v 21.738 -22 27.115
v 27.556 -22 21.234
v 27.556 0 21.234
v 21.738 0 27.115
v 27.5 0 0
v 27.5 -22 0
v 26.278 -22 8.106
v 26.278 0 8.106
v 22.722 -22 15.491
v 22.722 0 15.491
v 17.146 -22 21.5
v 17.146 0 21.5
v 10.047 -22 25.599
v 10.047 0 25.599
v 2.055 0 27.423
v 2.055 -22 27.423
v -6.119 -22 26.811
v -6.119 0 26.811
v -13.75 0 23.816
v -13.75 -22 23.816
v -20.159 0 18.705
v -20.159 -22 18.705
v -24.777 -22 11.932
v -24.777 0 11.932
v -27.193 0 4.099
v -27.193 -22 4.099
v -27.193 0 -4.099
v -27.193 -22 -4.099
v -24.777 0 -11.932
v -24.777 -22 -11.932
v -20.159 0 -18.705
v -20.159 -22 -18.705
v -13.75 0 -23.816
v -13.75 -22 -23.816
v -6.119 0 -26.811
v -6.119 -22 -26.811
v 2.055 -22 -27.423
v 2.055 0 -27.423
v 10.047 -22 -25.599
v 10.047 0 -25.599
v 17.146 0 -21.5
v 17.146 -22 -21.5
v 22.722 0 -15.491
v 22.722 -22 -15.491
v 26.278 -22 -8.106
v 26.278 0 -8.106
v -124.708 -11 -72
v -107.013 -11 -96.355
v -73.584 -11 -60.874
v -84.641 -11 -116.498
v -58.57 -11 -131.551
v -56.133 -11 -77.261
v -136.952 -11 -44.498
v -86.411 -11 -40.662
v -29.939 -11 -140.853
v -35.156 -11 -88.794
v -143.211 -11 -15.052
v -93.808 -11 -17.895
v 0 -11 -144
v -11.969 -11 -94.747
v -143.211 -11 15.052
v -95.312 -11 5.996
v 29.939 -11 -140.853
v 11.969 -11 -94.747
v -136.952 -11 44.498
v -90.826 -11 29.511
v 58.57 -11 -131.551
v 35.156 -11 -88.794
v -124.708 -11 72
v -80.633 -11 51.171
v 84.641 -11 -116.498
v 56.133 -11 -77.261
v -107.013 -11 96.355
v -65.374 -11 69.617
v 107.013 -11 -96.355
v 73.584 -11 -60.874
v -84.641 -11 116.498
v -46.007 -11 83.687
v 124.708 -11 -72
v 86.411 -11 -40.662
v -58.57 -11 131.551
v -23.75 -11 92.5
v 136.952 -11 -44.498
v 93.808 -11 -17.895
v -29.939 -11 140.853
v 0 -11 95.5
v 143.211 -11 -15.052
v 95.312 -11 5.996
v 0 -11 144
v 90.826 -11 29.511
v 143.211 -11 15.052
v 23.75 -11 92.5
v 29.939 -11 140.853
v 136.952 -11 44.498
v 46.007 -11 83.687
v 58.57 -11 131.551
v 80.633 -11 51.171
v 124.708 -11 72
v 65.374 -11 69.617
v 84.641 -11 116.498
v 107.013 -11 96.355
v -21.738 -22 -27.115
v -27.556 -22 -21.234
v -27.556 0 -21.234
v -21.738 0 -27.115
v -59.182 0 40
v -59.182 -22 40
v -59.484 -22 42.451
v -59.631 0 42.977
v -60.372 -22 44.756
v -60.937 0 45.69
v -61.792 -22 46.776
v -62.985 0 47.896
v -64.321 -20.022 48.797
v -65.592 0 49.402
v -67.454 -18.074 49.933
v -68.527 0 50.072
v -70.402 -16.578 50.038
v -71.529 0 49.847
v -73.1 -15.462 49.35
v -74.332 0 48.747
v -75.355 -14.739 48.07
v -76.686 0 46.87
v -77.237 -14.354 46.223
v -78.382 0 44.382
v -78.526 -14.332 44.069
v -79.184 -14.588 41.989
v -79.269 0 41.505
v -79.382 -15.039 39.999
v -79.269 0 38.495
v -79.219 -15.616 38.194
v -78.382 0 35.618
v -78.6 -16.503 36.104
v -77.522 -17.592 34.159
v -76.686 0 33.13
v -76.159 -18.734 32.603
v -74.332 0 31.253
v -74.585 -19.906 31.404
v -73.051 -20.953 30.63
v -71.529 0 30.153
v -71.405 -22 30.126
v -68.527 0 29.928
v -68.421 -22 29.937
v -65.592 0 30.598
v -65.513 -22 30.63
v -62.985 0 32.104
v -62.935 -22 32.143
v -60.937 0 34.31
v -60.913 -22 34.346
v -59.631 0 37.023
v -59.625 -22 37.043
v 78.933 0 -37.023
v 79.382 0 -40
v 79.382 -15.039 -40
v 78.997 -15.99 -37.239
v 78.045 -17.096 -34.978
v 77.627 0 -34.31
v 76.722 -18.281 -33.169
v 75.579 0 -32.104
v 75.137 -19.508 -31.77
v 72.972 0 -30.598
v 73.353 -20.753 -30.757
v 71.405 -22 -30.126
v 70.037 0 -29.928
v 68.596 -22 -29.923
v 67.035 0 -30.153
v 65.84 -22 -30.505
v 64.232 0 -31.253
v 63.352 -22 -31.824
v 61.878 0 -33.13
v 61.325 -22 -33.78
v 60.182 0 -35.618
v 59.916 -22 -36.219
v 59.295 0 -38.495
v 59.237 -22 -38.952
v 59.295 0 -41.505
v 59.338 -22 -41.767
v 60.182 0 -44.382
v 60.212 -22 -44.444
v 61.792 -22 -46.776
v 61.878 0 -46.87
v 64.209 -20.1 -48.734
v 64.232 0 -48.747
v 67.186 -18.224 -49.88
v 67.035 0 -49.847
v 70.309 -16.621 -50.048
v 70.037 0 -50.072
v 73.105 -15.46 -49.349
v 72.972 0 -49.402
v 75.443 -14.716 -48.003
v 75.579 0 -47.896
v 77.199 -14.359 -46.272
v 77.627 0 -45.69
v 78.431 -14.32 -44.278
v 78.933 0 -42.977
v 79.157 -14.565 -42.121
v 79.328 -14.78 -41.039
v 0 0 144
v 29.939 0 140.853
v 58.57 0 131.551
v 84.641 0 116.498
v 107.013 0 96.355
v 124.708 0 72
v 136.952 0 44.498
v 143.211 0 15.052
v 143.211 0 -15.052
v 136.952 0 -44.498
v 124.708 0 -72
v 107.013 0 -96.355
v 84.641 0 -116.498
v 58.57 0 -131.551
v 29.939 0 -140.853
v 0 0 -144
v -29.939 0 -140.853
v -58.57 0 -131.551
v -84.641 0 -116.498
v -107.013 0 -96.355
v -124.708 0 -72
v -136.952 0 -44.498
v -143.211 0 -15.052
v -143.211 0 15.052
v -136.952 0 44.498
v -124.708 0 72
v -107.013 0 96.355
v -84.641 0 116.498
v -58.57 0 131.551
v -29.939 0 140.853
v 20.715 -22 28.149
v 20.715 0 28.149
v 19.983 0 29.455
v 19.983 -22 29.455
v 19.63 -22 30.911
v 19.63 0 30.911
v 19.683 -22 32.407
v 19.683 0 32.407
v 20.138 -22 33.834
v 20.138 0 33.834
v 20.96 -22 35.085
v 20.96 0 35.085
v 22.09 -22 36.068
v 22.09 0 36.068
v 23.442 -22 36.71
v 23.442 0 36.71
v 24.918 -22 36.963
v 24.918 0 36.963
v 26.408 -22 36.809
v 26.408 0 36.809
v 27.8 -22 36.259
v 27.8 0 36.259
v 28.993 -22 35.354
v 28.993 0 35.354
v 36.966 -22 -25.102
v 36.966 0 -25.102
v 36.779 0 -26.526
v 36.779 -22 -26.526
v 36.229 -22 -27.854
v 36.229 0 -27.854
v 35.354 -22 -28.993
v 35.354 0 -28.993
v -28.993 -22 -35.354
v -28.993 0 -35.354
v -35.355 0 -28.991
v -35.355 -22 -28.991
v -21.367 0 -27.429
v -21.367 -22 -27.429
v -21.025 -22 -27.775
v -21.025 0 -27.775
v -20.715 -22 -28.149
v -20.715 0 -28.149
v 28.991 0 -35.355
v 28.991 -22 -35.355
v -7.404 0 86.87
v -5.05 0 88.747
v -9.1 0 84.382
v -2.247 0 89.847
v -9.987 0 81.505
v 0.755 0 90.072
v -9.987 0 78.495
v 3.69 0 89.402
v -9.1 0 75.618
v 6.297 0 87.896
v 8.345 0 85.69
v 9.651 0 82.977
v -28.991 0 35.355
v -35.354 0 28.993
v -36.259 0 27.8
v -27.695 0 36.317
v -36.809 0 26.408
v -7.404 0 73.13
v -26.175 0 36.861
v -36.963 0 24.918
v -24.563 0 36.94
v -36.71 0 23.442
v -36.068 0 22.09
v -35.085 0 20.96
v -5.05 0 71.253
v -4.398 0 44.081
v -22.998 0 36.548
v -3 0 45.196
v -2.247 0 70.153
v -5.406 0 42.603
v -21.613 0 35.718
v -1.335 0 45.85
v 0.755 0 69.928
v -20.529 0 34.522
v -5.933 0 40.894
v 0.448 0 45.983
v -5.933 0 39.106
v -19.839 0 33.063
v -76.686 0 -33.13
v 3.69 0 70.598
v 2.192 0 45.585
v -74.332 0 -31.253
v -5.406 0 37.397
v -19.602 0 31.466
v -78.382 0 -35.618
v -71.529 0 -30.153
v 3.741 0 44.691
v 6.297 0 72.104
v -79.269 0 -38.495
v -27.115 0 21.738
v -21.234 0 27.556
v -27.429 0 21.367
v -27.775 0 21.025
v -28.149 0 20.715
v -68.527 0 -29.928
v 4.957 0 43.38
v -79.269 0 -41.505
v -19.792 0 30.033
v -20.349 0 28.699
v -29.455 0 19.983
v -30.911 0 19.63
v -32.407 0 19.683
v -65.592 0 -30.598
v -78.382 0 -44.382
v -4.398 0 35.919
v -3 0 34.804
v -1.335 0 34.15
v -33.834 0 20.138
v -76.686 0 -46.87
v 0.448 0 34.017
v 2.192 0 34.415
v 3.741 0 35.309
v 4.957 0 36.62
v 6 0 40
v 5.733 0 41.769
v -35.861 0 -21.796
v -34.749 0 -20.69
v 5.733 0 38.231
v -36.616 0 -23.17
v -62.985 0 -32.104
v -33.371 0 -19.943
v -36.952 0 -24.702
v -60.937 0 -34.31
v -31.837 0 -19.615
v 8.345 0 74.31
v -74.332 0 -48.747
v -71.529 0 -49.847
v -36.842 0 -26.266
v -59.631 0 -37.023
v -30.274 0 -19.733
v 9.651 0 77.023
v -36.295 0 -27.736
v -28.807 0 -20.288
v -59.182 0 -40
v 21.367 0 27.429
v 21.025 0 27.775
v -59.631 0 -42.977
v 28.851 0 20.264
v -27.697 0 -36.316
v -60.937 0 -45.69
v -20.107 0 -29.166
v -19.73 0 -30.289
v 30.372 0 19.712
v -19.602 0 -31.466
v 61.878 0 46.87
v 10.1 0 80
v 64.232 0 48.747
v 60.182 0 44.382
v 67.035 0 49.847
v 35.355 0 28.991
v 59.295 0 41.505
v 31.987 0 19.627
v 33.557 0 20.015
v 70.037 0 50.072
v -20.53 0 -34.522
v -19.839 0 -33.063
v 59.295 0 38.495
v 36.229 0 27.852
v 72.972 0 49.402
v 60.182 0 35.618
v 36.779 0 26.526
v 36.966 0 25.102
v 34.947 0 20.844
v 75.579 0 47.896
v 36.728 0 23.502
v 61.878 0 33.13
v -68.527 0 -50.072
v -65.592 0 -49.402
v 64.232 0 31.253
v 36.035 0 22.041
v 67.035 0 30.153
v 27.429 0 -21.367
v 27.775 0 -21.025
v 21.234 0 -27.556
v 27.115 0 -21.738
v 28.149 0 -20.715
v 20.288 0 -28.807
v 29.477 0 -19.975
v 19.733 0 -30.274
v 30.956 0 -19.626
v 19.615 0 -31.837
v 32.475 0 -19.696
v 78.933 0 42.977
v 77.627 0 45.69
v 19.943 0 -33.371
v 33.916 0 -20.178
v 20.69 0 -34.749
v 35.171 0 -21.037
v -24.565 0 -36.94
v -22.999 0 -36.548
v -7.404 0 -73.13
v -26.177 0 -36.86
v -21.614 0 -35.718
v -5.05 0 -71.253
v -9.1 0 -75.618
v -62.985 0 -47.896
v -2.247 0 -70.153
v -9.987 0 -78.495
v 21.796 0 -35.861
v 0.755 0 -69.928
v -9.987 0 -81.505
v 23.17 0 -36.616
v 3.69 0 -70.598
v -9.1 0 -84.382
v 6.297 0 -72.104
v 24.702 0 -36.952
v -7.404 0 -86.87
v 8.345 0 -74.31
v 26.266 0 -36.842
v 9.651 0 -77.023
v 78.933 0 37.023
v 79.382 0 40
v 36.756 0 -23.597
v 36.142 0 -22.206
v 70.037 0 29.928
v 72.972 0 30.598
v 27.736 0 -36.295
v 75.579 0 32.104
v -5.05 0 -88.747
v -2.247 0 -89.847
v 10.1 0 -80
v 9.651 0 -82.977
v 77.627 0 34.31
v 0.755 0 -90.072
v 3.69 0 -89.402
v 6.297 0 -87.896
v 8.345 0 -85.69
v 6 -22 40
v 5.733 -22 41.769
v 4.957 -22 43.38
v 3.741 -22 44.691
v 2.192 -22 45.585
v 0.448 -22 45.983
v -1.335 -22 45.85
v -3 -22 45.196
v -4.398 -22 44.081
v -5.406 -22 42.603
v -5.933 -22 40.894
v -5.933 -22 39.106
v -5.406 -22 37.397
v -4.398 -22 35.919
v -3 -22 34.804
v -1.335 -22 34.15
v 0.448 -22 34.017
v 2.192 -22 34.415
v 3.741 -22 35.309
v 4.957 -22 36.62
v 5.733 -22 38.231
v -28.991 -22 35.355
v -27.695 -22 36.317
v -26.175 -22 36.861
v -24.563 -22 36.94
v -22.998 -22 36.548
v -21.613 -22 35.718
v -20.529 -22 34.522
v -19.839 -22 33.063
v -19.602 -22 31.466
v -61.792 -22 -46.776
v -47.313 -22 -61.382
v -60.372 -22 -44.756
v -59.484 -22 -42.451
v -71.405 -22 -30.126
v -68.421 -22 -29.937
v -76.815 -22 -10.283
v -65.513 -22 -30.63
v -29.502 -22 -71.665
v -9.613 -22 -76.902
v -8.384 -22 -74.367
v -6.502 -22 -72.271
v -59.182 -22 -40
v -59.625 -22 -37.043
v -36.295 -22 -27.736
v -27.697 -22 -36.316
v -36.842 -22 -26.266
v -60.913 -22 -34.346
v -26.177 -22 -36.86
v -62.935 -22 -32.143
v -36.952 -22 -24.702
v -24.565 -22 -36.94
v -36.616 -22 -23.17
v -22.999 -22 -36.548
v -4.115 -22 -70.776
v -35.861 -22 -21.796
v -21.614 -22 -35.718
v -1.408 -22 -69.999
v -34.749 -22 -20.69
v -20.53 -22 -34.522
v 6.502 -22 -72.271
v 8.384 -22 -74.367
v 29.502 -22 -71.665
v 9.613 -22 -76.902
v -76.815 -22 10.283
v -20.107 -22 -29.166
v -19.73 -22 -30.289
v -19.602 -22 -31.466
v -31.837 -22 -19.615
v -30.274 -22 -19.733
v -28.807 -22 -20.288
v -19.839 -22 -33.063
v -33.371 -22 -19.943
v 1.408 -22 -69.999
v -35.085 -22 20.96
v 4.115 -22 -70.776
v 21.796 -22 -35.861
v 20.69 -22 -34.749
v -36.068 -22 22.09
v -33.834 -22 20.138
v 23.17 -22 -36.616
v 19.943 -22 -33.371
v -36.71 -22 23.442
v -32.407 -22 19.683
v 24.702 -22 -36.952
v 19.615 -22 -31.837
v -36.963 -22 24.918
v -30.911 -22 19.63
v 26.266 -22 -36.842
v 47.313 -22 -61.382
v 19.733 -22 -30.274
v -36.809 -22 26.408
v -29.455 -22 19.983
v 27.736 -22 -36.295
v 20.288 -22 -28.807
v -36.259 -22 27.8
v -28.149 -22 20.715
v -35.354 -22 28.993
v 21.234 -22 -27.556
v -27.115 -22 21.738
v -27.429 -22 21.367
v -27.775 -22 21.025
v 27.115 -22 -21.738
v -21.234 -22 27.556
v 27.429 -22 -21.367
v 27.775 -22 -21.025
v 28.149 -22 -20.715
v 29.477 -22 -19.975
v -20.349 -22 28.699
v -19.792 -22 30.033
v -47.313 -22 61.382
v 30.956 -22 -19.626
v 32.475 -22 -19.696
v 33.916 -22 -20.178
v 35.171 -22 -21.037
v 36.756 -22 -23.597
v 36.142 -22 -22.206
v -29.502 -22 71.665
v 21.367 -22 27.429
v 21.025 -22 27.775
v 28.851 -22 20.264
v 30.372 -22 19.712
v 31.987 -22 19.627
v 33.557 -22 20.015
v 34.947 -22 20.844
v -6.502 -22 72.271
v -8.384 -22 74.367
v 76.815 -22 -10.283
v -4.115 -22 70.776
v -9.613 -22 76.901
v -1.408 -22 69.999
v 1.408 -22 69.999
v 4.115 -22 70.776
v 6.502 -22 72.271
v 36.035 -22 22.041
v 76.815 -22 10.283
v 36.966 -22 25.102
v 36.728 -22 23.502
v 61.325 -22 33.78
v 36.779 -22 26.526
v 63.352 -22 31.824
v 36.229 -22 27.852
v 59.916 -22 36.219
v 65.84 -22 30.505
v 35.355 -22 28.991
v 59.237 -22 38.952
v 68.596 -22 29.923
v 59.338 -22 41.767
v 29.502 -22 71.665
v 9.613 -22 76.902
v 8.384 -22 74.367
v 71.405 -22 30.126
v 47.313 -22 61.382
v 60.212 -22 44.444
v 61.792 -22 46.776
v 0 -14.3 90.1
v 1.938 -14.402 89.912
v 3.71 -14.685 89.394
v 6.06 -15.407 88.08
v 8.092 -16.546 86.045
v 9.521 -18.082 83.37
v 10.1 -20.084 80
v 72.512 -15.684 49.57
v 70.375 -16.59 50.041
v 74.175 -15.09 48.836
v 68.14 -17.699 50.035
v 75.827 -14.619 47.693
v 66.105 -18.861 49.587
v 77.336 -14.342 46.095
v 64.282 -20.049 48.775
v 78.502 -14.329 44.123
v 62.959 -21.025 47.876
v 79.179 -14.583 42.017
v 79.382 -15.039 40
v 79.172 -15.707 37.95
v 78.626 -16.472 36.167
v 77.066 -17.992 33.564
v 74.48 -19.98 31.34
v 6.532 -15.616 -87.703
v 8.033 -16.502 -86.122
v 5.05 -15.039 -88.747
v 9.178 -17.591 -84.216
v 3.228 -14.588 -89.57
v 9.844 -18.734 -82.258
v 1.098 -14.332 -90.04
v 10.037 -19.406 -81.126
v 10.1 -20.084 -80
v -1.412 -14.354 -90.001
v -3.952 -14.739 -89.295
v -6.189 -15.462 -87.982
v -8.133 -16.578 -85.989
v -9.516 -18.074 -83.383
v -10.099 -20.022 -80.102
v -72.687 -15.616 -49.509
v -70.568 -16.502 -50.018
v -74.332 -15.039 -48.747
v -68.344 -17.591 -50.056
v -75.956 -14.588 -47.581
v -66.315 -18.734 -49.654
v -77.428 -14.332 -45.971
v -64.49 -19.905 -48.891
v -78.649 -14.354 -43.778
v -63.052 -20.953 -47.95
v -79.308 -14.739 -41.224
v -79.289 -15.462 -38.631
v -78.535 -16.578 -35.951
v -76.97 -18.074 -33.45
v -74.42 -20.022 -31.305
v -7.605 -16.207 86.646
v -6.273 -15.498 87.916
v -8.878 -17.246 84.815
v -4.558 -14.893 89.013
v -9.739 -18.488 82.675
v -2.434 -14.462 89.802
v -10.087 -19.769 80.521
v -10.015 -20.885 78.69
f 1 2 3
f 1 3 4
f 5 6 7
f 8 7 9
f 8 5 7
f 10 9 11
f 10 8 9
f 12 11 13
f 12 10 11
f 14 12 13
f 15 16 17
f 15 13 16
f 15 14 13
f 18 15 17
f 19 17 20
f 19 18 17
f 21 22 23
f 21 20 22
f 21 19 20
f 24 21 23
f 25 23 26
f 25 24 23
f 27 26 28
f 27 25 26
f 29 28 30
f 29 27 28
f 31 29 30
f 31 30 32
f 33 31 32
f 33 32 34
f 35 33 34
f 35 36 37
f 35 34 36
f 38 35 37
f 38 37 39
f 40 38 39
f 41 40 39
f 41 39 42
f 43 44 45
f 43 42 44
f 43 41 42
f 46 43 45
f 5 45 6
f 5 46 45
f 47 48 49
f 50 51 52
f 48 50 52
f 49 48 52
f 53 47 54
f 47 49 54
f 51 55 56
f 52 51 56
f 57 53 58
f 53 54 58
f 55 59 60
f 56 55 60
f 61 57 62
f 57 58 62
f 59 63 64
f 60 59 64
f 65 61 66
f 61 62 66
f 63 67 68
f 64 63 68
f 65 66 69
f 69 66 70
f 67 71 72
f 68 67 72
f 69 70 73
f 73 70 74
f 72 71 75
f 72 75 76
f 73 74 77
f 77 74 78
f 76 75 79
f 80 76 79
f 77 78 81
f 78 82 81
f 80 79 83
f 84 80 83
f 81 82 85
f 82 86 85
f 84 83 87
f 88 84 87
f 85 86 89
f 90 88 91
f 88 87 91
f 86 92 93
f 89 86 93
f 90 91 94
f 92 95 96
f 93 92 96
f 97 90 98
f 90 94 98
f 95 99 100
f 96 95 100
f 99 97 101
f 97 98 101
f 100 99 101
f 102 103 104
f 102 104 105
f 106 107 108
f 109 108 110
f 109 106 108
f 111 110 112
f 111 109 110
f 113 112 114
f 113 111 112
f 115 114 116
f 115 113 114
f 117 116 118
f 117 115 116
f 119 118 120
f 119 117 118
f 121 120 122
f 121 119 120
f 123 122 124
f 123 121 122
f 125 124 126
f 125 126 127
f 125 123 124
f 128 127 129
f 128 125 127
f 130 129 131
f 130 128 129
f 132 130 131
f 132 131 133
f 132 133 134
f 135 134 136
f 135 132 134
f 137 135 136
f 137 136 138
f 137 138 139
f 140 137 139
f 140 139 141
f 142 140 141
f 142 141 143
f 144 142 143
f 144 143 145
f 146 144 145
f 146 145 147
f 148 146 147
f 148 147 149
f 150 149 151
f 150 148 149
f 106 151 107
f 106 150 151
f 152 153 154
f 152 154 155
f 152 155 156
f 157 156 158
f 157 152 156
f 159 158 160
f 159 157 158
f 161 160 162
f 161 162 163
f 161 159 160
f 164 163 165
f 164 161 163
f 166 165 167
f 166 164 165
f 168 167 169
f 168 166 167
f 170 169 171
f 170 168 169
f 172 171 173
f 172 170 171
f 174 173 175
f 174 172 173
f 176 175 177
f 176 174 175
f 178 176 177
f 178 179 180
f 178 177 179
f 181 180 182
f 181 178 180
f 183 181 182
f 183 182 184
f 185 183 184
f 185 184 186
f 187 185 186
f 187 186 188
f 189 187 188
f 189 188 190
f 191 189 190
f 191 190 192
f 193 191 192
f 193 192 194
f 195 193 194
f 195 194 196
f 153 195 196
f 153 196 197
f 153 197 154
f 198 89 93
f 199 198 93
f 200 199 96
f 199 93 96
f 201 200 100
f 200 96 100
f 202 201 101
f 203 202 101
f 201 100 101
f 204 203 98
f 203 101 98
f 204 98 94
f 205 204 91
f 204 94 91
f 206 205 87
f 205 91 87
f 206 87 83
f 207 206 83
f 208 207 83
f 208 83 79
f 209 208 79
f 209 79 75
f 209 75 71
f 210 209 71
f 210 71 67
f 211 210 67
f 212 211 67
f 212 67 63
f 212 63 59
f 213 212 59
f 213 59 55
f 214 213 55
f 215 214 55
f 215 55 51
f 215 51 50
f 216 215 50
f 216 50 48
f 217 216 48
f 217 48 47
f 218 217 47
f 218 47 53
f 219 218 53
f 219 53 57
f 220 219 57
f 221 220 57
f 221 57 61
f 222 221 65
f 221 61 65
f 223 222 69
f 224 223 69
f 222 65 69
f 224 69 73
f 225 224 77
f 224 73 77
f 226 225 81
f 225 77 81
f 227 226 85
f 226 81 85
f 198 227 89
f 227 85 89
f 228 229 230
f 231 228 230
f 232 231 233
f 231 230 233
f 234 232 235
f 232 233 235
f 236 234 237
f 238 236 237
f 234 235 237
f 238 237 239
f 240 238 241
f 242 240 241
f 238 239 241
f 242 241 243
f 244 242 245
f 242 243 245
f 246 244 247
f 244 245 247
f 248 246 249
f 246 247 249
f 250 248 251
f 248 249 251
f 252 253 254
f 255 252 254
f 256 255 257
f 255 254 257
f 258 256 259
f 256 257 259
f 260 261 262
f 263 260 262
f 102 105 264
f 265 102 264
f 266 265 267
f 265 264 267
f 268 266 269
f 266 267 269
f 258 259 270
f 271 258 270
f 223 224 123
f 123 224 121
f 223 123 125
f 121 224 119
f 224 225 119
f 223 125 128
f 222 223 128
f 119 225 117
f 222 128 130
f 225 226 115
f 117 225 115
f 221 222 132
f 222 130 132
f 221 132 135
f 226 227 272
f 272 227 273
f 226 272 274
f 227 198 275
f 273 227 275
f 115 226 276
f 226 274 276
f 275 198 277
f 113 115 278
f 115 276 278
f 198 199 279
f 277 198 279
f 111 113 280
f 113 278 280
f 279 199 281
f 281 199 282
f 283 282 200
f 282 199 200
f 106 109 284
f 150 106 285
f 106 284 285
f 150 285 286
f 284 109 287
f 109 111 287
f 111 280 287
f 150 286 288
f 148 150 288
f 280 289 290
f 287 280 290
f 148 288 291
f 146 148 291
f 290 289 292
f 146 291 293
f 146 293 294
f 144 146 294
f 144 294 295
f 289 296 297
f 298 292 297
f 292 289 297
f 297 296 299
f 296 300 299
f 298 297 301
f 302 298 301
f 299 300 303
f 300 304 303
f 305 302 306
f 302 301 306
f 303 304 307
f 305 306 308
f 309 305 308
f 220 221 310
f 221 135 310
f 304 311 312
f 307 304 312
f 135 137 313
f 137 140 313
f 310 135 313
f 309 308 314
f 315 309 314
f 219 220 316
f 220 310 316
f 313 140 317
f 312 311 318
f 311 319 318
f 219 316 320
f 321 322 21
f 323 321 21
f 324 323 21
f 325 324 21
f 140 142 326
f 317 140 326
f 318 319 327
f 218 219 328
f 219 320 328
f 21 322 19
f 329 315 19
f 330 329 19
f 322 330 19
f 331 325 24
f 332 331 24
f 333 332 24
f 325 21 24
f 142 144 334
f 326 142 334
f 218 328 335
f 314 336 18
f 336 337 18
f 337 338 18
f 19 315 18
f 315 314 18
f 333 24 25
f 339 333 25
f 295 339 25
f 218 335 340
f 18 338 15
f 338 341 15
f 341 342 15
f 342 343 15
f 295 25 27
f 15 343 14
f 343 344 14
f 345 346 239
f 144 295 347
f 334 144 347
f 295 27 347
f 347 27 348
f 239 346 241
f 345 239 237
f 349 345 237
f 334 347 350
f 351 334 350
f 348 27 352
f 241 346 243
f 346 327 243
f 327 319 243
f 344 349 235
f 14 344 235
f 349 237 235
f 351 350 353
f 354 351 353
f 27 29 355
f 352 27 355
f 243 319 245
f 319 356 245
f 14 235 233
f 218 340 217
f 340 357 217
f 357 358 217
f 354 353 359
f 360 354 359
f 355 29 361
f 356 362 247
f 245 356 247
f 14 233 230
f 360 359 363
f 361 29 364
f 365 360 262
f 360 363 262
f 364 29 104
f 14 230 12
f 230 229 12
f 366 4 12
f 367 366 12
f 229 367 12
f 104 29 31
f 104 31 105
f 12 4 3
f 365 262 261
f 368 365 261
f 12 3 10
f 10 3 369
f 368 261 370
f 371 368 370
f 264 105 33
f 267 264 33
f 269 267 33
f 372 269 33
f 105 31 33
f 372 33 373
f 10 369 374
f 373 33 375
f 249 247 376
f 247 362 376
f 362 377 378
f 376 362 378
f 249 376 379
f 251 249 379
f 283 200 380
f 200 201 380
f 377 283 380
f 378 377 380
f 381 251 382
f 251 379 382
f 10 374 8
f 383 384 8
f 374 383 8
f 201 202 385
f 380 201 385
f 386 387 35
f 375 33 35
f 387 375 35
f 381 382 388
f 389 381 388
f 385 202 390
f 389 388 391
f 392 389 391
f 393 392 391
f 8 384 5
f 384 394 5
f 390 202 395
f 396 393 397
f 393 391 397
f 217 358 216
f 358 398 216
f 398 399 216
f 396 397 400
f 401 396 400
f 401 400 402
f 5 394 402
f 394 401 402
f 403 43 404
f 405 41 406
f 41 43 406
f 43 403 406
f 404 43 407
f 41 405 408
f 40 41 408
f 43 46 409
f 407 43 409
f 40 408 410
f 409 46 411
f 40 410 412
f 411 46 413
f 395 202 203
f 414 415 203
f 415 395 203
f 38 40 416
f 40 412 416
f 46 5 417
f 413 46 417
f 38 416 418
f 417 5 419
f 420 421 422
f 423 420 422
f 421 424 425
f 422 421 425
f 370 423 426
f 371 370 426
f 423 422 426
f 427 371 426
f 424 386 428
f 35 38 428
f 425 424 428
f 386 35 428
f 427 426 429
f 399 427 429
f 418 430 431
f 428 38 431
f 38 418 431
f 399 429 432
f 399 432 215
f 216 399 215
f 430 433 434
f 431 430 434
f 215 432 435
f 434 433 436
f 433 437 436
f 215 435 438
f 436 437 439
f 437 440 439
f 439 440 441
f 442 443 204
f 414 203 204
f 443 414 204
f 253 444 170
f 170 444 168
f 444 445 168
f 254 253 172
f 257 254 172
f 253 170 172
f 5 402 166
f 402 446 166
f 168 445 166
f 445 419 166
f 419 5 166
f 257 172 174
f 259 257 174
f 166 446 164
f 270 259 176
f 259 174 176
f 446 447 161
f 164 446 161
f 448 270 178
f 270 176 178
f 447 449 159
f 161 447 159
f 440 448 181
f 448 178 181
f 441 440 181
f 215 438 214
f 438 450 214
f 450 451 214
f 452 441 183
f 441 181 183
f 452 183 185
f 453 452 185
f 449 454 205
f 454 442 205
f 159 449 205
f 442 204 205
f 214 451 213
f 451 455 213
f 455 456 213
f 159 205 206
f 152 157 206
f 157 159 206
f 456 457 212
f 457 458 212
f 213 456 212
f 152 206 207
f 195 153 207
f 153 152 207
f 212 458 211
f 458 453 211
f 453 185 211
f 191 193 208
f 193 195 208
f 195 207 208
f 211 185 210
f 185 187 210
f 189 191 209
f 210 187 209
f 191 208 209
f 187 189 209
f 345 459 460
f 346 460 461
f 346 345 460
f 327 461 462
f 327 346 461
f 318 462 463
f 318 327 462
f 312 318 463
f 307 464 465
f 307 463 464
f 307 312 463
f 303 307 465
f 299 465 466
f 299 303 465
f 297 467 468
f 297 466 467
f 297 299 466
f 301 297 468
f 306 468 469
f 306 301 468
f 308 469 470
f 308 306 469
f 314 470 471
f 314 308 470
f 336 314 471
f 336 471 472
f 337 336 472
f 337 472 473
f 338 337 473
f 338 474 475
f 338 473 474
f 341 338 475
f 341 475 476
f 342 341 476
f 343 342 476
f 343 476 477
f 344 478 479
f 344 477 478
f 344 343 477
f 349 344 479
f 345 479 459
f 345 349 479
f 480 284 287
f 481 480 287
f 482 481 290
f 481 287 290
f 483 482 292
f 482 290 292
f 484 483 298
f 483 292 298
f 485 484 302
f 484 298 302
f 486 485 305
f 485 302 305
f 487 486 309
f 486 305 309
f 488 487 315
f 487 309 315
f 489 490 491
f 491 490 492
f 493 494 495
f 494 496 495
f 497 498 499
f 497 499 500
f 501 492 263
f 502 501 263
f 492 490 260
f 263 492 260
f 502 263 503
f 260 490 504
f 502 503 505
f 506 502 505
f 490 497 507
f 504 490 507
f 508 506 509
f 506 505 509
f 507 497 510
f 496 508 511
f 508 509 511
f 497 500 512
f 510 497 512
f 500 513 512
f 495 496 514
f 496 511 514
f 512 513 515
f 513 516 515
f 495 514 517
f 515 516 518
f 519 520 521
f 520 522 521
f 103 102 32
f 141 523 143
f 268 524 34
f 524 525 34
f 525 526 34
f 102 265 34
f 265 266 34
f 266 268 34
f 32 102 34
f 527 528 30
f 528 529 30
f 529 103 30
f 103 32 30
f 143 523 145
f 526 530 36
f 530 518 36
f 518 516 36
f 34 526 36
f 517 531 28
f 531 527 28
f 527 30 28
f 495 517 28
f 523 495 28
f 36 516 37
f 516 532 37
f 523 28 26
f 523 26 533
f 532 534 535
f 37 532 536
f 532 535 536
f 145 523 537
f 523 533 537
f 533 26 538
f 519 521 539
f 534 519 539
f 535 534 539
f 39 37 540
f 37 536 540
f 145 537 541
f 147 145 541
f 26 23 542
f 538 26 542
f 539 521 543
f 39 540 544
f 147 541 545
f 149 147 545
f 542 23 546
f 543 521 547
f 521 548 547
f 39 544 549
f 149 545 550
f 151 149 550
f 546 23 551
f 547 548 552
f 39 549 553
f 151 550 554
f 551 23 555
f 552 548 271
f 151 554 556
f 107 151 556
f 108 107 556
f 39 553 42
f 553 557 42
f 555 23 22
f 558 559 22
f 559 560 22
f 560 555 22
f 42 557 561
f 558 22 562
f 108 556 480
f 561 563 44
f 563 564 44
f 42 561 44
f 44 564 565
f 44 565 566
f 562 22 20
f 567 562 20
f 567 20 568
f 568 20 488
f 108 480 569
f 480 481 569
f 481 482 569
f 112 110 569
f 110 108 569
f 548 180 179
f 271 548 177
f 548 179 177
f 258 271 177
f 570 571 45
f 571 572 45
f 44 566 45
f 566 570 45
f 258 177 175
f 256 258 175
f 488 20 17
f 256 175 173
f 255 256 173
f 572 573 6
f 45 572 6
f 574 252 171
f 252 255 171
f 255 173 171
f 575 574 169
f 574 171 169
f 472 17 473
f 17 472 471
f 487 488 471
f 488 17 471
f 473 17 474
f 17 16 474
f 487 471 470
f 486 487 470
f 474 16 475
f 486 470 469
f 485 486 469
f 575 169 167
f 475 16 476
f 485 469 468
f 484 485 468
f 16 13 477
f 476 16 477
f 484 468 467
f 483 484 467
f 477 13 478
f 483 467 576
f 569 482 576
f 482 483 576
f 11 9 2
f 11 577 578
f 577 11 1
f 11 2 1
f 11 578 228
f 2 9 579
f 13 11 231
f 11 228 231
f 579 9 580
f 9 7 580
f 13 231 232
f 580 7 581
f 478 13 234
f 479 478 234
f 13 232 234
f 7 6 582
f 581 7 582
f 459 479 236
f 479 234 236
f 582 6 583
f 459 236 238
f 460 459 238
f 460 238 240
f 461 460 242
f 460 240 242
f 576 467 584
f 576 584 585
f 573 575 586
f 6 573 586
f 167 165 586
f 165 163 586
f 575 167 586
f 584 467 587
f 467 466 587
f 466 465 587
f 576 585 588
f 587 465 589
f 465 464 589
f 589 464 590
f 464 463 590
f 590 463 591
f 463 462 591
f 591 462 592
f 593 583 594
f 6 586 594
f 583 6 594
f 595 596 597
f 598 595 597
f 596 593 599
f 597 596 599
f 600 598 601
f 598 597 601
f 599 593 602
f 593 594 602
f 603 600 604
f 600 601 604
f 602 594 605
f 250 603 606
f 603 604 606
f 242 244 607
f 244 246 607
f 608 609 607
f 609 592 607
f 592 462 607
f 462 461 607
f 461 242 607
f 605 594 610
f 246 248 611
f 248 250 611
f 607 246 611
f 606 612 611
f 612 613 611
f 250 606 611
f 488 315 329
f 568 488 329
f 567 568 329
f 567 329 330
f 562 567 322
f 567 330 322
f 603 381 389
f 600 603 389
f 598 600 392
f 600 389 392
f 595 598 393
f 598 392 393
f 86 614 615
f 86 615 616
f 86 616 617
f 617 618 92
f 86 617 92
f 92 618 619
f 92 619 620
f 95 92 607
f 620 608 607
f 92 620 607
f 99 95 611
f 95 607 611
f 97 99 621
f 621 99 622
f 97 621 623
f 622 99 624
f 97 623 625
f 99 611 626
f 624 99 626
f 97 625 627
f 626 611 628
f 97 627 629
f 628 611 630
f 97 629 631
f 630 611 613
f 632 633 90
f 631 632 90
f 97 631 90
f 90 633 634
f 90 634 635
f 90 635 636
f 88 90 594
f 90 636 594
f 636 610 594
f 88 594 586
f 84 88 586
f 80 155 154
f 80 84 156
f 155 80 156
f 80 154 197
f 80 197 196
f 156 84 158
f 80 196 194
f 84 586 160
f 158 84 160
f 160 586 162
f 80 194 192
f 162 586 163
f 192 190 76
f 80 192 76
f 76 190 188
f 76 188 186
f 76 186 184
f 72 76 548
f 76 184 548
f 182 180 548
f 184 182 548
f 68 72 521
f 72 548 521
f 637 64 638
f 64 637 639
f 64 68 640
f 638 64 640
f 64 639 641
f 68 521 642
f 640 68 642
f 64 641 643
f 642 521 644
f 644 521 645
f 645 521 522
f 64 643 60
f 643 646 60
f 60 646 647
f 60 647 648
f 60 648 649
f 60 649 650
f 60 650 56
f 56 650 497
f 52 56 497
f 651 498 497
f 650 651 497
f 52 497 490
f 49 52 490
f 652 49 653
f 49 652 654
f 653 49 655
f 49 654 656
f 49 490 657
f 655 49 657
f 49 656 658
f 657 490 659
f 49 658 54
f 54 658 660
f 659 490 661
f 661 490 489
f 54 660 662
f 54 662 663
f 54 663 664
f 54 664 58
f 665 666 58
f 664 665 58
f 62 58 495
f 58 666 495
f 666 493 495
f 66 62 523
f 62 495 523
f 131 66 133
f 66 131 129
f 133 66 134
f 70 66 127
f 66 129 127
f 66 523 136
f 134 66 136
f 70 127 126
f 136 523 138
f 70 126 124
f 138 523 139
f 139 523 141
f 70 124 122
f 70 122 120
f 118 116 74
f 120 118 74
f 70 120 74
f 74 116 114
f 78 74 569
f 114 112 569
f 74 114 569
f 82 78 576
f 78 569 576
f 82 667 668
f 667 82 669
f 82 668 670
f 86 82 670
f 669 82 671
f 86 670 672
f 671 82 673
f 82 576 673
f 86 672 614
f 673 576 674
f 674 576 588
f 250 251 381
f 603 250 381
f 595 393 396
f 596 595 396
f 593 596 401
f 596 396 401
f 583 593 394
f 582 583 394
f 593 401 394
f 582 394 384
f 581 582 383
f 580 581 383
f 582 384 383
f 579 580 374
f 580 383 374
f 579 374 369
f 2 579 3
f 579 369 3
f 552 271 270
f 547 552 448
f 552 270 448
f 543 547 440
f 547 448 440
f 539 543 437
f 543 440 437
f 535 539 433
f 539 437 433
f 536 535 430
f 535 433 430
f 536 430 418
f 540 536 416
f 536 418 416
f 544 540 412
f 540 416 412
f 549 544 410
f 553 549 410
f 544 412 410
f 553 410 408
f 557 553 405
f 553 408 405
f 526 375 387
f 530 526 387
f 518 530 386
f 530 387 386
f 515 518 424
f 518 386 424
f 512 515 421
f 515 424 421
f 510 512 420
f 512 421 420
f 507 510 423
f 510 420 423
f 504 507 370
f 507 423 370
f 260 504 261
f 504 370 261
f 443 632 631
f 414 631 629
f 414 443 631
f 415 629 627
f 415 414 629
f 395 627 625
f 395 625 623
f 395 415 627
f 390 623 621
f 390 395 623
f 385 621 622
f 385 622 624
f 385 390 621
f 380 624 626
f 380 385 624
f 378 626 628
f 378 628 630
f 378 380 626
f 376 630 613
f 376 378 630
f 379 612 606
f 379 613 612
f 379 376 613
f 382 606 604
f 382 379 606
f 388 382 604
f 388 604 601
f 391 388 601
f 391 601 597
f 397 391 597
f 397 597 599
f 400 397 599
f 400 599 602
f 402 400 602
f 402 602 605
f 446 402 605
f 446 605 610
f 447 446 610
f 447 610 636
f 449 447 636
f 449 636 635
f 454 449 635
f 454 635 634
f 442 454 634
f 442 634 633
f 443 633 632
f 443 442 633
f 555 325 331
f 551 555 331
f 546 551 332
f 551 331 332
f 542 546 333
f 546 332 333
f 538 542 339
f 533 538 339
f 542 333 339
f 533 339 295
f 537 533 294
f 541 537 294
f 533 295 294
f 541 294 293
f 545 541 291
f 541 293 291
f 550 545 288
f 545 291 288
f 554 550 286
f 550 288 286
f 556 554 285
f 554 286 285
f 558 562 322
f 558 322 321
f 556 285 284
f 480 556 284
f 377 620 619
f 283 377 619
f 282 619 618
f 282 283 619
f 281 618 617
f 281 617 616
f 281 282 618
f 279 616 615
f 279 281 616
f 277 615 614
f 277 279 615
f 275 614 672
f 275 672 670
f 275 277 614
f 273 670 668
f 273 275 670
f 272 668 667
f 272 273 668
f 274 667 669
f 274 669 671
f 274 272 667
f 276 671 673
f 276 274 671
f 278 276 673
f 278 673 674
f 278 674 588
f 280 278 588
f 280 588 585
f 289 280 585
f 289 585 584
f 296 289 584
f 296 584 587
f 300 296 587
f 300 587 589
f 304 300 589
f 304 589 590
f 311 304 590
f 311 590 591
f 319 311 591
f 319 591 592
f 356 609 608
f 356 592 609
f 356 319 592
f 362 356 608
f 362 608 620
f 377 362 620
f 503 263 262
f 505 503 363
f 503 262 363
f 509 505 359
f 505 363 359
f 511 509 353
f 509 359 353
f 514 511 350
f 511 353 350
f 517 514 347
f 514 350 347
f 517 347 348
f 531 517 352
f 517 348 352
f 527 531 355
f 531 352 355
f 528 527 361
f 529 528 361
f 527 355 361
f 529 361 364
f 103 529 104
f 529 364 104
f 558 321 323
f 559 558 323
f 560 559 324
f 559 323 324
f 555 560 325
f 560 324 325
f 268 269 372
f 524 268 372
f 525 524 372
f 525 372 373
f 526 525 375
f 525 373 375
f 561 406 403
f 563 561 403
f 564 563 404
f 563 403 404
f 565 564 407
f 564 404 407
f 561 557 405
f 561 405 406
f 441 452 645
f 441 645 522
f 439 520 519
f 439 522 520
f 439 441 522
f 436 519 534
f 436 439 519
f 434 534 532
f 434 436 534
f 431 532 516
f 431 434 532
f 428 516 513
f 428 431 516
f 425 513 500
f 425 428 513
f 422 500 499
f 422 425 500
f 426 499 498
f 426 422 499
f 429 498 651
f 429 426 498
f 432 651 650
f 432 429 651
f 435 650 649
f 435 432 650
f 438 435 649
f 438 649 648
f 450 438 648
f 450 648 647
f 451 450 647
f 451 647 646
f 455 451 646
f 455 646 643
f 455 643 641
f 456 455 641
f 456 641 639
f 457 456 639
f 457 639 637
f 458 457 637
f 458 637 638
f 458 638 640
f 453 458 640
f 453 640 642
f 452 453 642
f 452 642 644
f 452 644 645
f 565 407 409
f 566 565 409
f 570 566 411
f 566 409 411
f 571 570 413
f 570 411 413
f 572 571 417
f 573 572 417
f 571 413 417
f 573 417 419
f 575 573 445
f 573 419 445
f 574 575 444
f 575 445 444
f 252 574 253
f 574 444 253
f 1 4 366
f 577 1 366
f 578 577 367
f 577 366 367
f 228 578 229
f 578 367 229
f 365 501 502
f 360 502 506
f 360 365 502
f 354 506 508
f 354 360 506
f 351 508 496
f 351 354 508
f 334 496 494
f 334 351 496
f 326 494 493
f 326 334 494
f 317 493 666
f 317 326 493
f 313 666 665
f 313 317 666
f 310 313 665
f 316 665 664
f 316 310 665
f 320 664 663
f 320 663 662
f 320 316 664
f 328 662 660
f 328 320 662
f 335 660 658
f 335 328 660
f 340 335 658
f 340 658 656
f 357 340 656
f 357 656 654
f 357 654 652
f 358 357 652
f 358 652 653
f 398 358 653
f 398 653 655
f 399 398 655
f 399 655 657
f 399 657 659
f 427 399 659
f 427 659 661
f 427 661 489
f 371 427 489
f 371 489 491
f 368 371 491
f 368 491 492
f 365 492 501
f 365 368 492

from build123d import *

# Parameters (mm, degrees)
F0_R     = 144
F0_R_2   = 10.1
F0_R_3   = 27.5
F0_R_4   = 6
F3_DEPTH = 25


with BuildPart() as f2:
    # F1 (on Right) → F2 (revolve)
    with BuildSketch(Plane.YZ):
        Polygon((-22, 0), (0, 0), (0, 144), (-11, 144), (-11, 95.5), (-22, 77.5), align=None)
    revolve(axis=Axis((0, -11, 0), (0, 1, 0)))

    # F0 (on Front) → F3 (intersect)
    with BuildSketch(Plane.XZ):
        Circle(F0_R)
        with Locations((-69.282032, -40)):
            Circle(F0_R_2, mode=Mode.SUBTRACT)
        with BuildLine():
            ThreePointArc((-35.355339, -28.991378), (-35.344887, -21.202779), (-27.556343, -21.234136))
            Line((-27.556343, -21.234136), (-21.738307, -27.114974))
            ThreePointArc((-21.738307, -27.114974), (-21.192382, -27.598098), (-20.715148, -28.149178))
            ThreePointArc((-20.715148, -28.149178), (-19.887922, -29.716864), (-19.602291, -31.466252))
            ThreePointArc((-19.602291, -31.466252), (-22.998539, -36.548006), (-28.99292, -35.353796))
            Line((-28.99292, -35.353796), (-35.355339, -28.991378))
        make_face(mode=Mode.SUBTRACT)
        with Locations((0, -80)):
            Circle(F0_R_2, mode=Mode.SUBTRACT)
        with Locations((69.282032, -40)):
            Circle(F0_R_2, mode=Mode.SUBTRACT)
        with BuildLine():
            ThreePointArc((28.991378, -35.355339), (21.202779, -35.344887), (21.234136, -27.556343))
            Line((21.234136, -27.556343), (27.114974, -21.738307))
            ThreePointArc((27.114974, -21.738307), (27.598098, -21.192382), (28.149178, -20.715148))
            ThreePointArc((28.149178, -20.715148), (33.916363, -20.178171), (36.966252, -25.102291))
            ThreePointArc((36.966252, -25.102291), (36.547172, -27.208057), (35.353796, -28.99292))
            Line((35.353796, -28.99292), (28.991378, -35.355339))
        make_face(mode=Mode.SUBTRACT)
        with BuildLine():
            ThreePointArc((-28.991378, 35.355339), (-22.997532, 36.547589), (-19.602291, 31.466252))
            ThreePointArc((-19.602291, 31.466252), (-20.026621, 29.347862), (-21.234136, 27.556343))
            Line((-21.234136, 27.556343), (-27.114974, 21.738307))
            ThreePointArc((-27.114974, 21.738307), (-27.598098, 21.192382), (-28.149178, 20.715148))
            ThreePointArc((-28.149178, 20.715148), (-35.614955, 21.491437), (-35.353796, 28.99292))
            Line((-35.353796, 28.99292), (-28.991378, 35.355339))
        make_face(mode=Mode.SUBTRACT)
        with Locations((-69.282032, 40)):
            Circle(F0_R_2, mode=Mode.SUBTRACT)
        Circle(F0_R_3, mode=Mode.SUBTRACT)
        with BuildLine():
            ThreePointArc((35.355339, 28.991378), (36.547589, 27.20705), (36.966252, 25.102291))
            ThreePointArc((36.966252, 25.102291), (33.557364, 20.015322), (27.556343, 21.234136))
            Line((27.556343, 21.234136), (21.738307, 27.114974))
            ThreePointArc((21.738307, 27.114974), (21.192382, 27.598098), (20.715148, 28.149178))
            ThreePointArc((20.715148, 28.149178), (21.491437, 35.614955), (28.99292, 35.353796))
            Line((28.99292, 35.353796), (35.355339, 28.991378))
        make_face(mode=Mode.SUBTRACT)
        with Locations((0, 40)):
            Circle(F0_R_4, mode=Mode.SUBTRACT)
        with Locations((69.282032, 40)):
            Circle(F0_R_2, mode=Mode.SUBTRACT)
        with Locations((0, 80)):
            Circle(F0_R_2, mode=Mode.SUBTRACT)
    extrude(amount=F3_DEPTH, mode=Mode.INTERSECT)


solid = f2.part
